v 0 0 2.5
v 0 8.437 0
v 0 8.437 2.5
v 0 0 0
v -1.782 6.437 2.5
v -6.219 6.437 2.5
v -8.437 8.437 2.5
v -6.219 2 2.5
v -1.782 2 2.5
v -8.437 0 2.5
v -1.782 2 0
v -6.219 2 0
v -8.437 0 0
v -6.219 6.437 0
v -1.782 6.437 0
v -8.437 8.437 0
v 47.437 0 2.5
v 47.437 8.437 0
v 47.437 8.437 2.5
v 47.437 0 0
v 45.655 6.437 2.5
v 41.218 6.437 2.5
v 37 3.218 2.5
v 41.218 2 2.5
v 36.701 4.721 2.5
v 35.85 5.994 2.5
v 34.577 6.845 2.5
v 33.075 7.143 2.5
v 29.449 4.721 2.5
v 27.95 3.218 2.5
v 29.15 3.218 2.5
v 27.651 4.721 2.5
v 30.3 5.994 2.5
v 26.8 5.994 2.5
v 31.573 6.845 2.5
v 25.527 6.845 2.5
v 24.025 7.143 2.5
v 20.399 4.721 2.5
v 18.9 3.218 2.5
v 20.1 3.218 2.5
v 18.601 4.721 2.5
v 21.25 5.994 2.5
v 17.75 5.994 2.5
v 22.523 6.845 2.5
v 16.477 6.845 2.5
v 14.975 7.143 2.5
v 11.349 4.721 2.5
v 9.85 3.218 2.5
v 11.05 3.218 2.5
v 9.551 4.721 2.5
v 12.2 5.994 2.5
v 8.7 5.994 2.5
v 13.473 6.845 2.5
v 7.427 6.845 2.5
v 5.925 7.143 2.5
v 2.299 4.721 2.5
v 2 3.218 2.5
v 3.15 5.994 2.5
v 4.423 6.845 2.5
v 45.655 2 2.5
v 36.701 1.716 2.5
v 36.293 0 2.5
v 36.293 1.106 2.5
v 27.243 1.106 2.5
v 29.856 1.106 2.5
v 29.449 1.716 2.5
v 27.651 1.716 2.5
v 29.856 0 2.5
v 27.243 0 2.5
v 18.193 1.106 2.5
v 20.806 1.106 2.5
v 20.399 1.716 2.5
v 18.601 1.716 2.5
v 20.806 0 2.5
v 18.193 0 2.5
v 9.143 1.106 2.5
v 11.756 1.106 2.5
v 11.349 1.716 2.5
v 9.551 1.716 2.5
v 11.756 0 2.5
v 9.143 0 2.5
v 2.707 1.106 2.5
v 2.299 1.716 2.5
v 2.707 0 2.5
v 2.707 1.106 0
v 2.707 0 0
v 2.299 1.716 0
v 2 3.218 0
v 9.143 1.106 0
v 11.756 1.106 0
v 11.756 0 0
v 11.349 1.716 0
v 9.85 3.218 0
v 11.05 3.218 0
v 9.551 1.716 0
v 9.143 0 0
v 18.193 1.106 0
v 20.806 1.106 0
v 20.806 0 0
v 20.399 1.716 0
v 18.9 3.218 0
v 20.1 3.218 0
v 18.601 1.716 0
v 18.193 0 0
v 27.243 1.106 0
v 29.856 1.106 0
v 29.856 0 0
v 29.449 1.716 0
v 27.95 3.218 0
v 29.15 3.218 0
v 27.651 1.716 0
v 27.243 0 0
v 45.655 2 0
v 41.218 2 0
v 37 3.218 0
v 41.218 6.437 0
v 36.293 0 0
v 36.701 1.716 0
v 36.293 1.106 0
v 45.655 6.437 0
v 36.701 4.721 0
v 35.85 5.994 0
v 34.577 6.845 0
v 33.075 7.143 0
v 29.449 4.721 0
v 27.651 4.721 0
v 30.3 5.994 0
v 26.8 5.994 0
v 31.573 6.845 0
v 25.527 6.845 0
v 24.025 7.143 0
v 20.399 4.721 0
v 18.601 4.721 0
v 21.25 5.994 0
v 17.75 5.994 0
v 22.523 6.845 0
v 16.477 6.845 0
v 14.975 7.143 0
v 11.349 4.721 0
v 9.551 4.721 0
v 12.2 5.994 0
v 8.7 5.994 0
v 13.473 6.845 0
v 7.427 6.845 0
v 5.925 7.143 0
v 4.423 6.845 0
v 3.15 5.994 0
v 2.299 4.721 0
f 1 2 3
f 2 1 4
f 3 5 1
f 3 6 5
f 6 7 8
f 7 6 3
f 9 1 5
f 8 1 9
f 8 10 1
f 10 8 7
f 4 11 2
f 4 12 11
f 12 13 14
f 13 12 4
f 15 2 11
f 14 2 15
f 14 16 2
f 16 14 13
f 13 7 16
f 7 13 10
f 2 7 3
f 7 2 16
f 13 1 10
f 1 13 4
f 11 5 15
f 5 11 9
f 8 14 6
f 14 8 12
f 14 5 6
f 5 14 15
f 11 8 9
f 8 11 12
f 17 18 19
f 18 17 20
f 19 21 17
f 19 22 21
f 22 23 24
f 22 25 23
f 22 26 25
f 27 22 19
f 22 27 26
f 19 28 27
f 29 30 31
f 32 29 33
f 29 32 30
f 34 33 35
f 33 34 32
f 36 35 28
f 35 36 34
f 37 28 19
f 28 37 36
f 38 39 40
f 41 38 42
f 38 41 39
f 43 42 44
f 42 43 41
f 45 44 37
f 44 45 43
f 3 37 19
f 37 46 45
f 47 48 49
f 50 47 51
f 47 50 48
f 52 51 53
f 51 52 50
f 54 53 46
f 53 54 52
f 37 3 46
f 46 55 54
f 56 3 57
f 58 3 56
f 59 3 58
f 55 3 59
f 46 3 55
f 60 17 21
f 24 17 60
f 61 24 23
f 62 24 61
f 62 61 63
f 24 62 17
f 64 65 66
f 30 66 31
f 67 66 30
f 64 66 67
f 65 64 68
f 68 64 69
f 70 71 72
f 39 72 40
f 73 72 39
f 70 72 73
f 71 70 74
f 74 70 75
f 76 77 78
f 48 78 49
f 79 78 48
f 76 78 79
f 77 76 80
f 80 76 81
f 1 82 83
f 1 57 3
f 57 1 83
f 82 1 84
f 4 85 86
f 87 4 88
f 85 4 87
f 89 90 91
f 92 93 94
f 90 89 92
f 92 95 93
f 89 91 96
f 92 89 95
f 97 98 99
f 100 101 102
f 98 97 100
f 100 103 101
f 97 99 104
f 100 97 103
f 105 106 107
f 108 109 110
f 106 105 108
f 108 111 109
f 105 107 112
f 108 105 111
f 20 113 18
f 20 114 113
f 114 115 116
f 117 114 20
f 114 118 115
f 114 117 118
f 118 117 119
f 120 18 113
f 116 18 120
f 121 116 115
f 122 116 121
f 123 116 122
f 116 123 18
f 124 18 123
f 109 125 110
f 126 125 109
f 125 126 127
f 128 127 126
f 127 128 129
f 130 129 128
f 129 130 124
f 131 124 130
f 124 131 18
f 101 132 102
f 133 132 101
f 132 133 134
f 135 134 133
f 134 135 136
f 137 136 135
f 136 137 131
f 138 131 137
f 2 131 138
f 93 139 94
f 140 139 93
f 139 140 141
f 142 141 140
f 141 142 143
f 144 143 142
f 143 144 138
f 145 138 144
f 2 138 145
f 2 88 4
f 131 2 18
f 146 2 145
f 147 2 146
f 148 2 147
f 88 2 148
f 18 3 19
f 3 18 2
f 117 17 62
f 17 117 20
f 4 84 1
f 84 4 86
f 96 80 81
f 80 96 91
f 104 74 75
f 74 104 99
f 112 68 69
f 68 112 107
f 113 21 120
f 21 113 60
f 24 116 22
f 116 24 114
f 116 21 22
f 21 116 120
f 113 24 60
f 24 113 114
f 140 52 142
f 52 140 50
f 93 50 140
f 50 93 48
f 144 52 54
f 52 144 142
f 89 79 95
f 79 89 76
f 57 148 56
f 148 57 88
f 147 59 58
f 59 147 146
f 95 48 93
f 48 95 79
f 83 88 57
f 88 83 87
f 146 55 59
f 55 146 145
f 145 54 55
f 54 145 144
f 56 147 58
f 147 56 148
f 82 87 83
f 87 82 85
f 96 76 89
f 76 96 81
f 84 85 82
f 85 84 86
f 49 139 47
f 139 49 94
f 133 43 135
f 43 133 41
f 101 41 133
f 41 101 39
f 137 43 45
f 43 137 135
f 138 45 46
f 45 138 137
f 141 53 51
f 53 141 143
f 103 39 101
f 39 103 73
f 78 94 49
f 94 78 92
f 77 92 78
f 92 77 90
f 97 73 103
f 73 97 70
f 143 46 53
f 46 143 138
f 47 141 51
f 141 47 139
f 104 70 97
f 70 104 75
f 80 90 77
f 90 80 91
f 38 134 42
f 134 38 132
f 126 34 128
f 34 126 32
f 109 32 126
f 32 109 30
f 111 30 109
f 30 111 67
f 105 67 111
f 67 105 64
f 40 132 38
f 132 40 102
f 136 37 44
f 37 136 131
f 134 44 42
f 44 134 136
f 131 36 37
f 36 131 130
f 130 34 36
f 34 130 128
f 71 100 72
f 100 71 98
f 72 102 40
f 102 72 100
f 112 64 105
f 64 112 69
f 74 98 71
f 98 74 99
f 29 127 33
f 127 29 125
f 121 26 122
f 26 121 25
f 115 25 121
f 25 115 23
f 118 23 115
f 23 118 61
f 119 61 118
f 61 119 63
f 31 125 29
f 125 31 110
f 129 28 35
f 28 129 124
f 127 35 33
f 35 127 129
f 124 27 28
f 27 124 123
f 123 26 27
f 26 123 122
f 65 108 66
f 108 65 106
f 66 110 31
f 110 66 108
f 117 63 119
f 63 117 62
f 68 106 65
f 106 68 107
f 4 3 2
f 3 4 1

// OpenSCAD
// in mm
dia=7.85;

count=4;

// in mm
spacing=1.2;

// in mm
border=2;

// percent of wire that extends beyond clip
reveal=18;

// in mm

// in mm
thickness=2.5;

/* [hidden] */
tab_size=(dia*(100-reveal)/100)+border;
tab_hole=tab_size-(border*2);

module clip_thing() {
	tab_thickness=thickness;//border;
	difference() {
		cube([tab_size,tab_size,tab_thickness]);
		translate([tab_hole/2,border,-1]) cube([tab_hole,tab_hole,tab_thickness+2]);
	}
}

union() {
	translate([-tab_size,0,0]) clip_thing();
	translate([(count*dia)+((count-1)*spacing)+(border*2),0,0]) clip_thing();

	difference() { // the clip
		cube([(count*dia)+((count-1)*spacing)+(border*2),(dia*(100-reveal)/100)+(border),thickness]); // the body
		translate([(border+(dia/2)),((dia/2)*(100-reveal)/100),0]) for(x=[0:count-1]){ // the wires
			translate([x*(dia+spacing),0,-1]) cylinder(r=dia/2,h=thickness+2,$fn=16); // a wire
			echo("wire min clip width=",(dia*(100-reveal)/100));
			translate([(x*(dia+spacing))-((dia*(100-reveal)/100)/2),-dia,-1]) cube([(dia*(100-reveal)/100),dia,thickness+2]); // cut off sharp edges
		}
	}
}
